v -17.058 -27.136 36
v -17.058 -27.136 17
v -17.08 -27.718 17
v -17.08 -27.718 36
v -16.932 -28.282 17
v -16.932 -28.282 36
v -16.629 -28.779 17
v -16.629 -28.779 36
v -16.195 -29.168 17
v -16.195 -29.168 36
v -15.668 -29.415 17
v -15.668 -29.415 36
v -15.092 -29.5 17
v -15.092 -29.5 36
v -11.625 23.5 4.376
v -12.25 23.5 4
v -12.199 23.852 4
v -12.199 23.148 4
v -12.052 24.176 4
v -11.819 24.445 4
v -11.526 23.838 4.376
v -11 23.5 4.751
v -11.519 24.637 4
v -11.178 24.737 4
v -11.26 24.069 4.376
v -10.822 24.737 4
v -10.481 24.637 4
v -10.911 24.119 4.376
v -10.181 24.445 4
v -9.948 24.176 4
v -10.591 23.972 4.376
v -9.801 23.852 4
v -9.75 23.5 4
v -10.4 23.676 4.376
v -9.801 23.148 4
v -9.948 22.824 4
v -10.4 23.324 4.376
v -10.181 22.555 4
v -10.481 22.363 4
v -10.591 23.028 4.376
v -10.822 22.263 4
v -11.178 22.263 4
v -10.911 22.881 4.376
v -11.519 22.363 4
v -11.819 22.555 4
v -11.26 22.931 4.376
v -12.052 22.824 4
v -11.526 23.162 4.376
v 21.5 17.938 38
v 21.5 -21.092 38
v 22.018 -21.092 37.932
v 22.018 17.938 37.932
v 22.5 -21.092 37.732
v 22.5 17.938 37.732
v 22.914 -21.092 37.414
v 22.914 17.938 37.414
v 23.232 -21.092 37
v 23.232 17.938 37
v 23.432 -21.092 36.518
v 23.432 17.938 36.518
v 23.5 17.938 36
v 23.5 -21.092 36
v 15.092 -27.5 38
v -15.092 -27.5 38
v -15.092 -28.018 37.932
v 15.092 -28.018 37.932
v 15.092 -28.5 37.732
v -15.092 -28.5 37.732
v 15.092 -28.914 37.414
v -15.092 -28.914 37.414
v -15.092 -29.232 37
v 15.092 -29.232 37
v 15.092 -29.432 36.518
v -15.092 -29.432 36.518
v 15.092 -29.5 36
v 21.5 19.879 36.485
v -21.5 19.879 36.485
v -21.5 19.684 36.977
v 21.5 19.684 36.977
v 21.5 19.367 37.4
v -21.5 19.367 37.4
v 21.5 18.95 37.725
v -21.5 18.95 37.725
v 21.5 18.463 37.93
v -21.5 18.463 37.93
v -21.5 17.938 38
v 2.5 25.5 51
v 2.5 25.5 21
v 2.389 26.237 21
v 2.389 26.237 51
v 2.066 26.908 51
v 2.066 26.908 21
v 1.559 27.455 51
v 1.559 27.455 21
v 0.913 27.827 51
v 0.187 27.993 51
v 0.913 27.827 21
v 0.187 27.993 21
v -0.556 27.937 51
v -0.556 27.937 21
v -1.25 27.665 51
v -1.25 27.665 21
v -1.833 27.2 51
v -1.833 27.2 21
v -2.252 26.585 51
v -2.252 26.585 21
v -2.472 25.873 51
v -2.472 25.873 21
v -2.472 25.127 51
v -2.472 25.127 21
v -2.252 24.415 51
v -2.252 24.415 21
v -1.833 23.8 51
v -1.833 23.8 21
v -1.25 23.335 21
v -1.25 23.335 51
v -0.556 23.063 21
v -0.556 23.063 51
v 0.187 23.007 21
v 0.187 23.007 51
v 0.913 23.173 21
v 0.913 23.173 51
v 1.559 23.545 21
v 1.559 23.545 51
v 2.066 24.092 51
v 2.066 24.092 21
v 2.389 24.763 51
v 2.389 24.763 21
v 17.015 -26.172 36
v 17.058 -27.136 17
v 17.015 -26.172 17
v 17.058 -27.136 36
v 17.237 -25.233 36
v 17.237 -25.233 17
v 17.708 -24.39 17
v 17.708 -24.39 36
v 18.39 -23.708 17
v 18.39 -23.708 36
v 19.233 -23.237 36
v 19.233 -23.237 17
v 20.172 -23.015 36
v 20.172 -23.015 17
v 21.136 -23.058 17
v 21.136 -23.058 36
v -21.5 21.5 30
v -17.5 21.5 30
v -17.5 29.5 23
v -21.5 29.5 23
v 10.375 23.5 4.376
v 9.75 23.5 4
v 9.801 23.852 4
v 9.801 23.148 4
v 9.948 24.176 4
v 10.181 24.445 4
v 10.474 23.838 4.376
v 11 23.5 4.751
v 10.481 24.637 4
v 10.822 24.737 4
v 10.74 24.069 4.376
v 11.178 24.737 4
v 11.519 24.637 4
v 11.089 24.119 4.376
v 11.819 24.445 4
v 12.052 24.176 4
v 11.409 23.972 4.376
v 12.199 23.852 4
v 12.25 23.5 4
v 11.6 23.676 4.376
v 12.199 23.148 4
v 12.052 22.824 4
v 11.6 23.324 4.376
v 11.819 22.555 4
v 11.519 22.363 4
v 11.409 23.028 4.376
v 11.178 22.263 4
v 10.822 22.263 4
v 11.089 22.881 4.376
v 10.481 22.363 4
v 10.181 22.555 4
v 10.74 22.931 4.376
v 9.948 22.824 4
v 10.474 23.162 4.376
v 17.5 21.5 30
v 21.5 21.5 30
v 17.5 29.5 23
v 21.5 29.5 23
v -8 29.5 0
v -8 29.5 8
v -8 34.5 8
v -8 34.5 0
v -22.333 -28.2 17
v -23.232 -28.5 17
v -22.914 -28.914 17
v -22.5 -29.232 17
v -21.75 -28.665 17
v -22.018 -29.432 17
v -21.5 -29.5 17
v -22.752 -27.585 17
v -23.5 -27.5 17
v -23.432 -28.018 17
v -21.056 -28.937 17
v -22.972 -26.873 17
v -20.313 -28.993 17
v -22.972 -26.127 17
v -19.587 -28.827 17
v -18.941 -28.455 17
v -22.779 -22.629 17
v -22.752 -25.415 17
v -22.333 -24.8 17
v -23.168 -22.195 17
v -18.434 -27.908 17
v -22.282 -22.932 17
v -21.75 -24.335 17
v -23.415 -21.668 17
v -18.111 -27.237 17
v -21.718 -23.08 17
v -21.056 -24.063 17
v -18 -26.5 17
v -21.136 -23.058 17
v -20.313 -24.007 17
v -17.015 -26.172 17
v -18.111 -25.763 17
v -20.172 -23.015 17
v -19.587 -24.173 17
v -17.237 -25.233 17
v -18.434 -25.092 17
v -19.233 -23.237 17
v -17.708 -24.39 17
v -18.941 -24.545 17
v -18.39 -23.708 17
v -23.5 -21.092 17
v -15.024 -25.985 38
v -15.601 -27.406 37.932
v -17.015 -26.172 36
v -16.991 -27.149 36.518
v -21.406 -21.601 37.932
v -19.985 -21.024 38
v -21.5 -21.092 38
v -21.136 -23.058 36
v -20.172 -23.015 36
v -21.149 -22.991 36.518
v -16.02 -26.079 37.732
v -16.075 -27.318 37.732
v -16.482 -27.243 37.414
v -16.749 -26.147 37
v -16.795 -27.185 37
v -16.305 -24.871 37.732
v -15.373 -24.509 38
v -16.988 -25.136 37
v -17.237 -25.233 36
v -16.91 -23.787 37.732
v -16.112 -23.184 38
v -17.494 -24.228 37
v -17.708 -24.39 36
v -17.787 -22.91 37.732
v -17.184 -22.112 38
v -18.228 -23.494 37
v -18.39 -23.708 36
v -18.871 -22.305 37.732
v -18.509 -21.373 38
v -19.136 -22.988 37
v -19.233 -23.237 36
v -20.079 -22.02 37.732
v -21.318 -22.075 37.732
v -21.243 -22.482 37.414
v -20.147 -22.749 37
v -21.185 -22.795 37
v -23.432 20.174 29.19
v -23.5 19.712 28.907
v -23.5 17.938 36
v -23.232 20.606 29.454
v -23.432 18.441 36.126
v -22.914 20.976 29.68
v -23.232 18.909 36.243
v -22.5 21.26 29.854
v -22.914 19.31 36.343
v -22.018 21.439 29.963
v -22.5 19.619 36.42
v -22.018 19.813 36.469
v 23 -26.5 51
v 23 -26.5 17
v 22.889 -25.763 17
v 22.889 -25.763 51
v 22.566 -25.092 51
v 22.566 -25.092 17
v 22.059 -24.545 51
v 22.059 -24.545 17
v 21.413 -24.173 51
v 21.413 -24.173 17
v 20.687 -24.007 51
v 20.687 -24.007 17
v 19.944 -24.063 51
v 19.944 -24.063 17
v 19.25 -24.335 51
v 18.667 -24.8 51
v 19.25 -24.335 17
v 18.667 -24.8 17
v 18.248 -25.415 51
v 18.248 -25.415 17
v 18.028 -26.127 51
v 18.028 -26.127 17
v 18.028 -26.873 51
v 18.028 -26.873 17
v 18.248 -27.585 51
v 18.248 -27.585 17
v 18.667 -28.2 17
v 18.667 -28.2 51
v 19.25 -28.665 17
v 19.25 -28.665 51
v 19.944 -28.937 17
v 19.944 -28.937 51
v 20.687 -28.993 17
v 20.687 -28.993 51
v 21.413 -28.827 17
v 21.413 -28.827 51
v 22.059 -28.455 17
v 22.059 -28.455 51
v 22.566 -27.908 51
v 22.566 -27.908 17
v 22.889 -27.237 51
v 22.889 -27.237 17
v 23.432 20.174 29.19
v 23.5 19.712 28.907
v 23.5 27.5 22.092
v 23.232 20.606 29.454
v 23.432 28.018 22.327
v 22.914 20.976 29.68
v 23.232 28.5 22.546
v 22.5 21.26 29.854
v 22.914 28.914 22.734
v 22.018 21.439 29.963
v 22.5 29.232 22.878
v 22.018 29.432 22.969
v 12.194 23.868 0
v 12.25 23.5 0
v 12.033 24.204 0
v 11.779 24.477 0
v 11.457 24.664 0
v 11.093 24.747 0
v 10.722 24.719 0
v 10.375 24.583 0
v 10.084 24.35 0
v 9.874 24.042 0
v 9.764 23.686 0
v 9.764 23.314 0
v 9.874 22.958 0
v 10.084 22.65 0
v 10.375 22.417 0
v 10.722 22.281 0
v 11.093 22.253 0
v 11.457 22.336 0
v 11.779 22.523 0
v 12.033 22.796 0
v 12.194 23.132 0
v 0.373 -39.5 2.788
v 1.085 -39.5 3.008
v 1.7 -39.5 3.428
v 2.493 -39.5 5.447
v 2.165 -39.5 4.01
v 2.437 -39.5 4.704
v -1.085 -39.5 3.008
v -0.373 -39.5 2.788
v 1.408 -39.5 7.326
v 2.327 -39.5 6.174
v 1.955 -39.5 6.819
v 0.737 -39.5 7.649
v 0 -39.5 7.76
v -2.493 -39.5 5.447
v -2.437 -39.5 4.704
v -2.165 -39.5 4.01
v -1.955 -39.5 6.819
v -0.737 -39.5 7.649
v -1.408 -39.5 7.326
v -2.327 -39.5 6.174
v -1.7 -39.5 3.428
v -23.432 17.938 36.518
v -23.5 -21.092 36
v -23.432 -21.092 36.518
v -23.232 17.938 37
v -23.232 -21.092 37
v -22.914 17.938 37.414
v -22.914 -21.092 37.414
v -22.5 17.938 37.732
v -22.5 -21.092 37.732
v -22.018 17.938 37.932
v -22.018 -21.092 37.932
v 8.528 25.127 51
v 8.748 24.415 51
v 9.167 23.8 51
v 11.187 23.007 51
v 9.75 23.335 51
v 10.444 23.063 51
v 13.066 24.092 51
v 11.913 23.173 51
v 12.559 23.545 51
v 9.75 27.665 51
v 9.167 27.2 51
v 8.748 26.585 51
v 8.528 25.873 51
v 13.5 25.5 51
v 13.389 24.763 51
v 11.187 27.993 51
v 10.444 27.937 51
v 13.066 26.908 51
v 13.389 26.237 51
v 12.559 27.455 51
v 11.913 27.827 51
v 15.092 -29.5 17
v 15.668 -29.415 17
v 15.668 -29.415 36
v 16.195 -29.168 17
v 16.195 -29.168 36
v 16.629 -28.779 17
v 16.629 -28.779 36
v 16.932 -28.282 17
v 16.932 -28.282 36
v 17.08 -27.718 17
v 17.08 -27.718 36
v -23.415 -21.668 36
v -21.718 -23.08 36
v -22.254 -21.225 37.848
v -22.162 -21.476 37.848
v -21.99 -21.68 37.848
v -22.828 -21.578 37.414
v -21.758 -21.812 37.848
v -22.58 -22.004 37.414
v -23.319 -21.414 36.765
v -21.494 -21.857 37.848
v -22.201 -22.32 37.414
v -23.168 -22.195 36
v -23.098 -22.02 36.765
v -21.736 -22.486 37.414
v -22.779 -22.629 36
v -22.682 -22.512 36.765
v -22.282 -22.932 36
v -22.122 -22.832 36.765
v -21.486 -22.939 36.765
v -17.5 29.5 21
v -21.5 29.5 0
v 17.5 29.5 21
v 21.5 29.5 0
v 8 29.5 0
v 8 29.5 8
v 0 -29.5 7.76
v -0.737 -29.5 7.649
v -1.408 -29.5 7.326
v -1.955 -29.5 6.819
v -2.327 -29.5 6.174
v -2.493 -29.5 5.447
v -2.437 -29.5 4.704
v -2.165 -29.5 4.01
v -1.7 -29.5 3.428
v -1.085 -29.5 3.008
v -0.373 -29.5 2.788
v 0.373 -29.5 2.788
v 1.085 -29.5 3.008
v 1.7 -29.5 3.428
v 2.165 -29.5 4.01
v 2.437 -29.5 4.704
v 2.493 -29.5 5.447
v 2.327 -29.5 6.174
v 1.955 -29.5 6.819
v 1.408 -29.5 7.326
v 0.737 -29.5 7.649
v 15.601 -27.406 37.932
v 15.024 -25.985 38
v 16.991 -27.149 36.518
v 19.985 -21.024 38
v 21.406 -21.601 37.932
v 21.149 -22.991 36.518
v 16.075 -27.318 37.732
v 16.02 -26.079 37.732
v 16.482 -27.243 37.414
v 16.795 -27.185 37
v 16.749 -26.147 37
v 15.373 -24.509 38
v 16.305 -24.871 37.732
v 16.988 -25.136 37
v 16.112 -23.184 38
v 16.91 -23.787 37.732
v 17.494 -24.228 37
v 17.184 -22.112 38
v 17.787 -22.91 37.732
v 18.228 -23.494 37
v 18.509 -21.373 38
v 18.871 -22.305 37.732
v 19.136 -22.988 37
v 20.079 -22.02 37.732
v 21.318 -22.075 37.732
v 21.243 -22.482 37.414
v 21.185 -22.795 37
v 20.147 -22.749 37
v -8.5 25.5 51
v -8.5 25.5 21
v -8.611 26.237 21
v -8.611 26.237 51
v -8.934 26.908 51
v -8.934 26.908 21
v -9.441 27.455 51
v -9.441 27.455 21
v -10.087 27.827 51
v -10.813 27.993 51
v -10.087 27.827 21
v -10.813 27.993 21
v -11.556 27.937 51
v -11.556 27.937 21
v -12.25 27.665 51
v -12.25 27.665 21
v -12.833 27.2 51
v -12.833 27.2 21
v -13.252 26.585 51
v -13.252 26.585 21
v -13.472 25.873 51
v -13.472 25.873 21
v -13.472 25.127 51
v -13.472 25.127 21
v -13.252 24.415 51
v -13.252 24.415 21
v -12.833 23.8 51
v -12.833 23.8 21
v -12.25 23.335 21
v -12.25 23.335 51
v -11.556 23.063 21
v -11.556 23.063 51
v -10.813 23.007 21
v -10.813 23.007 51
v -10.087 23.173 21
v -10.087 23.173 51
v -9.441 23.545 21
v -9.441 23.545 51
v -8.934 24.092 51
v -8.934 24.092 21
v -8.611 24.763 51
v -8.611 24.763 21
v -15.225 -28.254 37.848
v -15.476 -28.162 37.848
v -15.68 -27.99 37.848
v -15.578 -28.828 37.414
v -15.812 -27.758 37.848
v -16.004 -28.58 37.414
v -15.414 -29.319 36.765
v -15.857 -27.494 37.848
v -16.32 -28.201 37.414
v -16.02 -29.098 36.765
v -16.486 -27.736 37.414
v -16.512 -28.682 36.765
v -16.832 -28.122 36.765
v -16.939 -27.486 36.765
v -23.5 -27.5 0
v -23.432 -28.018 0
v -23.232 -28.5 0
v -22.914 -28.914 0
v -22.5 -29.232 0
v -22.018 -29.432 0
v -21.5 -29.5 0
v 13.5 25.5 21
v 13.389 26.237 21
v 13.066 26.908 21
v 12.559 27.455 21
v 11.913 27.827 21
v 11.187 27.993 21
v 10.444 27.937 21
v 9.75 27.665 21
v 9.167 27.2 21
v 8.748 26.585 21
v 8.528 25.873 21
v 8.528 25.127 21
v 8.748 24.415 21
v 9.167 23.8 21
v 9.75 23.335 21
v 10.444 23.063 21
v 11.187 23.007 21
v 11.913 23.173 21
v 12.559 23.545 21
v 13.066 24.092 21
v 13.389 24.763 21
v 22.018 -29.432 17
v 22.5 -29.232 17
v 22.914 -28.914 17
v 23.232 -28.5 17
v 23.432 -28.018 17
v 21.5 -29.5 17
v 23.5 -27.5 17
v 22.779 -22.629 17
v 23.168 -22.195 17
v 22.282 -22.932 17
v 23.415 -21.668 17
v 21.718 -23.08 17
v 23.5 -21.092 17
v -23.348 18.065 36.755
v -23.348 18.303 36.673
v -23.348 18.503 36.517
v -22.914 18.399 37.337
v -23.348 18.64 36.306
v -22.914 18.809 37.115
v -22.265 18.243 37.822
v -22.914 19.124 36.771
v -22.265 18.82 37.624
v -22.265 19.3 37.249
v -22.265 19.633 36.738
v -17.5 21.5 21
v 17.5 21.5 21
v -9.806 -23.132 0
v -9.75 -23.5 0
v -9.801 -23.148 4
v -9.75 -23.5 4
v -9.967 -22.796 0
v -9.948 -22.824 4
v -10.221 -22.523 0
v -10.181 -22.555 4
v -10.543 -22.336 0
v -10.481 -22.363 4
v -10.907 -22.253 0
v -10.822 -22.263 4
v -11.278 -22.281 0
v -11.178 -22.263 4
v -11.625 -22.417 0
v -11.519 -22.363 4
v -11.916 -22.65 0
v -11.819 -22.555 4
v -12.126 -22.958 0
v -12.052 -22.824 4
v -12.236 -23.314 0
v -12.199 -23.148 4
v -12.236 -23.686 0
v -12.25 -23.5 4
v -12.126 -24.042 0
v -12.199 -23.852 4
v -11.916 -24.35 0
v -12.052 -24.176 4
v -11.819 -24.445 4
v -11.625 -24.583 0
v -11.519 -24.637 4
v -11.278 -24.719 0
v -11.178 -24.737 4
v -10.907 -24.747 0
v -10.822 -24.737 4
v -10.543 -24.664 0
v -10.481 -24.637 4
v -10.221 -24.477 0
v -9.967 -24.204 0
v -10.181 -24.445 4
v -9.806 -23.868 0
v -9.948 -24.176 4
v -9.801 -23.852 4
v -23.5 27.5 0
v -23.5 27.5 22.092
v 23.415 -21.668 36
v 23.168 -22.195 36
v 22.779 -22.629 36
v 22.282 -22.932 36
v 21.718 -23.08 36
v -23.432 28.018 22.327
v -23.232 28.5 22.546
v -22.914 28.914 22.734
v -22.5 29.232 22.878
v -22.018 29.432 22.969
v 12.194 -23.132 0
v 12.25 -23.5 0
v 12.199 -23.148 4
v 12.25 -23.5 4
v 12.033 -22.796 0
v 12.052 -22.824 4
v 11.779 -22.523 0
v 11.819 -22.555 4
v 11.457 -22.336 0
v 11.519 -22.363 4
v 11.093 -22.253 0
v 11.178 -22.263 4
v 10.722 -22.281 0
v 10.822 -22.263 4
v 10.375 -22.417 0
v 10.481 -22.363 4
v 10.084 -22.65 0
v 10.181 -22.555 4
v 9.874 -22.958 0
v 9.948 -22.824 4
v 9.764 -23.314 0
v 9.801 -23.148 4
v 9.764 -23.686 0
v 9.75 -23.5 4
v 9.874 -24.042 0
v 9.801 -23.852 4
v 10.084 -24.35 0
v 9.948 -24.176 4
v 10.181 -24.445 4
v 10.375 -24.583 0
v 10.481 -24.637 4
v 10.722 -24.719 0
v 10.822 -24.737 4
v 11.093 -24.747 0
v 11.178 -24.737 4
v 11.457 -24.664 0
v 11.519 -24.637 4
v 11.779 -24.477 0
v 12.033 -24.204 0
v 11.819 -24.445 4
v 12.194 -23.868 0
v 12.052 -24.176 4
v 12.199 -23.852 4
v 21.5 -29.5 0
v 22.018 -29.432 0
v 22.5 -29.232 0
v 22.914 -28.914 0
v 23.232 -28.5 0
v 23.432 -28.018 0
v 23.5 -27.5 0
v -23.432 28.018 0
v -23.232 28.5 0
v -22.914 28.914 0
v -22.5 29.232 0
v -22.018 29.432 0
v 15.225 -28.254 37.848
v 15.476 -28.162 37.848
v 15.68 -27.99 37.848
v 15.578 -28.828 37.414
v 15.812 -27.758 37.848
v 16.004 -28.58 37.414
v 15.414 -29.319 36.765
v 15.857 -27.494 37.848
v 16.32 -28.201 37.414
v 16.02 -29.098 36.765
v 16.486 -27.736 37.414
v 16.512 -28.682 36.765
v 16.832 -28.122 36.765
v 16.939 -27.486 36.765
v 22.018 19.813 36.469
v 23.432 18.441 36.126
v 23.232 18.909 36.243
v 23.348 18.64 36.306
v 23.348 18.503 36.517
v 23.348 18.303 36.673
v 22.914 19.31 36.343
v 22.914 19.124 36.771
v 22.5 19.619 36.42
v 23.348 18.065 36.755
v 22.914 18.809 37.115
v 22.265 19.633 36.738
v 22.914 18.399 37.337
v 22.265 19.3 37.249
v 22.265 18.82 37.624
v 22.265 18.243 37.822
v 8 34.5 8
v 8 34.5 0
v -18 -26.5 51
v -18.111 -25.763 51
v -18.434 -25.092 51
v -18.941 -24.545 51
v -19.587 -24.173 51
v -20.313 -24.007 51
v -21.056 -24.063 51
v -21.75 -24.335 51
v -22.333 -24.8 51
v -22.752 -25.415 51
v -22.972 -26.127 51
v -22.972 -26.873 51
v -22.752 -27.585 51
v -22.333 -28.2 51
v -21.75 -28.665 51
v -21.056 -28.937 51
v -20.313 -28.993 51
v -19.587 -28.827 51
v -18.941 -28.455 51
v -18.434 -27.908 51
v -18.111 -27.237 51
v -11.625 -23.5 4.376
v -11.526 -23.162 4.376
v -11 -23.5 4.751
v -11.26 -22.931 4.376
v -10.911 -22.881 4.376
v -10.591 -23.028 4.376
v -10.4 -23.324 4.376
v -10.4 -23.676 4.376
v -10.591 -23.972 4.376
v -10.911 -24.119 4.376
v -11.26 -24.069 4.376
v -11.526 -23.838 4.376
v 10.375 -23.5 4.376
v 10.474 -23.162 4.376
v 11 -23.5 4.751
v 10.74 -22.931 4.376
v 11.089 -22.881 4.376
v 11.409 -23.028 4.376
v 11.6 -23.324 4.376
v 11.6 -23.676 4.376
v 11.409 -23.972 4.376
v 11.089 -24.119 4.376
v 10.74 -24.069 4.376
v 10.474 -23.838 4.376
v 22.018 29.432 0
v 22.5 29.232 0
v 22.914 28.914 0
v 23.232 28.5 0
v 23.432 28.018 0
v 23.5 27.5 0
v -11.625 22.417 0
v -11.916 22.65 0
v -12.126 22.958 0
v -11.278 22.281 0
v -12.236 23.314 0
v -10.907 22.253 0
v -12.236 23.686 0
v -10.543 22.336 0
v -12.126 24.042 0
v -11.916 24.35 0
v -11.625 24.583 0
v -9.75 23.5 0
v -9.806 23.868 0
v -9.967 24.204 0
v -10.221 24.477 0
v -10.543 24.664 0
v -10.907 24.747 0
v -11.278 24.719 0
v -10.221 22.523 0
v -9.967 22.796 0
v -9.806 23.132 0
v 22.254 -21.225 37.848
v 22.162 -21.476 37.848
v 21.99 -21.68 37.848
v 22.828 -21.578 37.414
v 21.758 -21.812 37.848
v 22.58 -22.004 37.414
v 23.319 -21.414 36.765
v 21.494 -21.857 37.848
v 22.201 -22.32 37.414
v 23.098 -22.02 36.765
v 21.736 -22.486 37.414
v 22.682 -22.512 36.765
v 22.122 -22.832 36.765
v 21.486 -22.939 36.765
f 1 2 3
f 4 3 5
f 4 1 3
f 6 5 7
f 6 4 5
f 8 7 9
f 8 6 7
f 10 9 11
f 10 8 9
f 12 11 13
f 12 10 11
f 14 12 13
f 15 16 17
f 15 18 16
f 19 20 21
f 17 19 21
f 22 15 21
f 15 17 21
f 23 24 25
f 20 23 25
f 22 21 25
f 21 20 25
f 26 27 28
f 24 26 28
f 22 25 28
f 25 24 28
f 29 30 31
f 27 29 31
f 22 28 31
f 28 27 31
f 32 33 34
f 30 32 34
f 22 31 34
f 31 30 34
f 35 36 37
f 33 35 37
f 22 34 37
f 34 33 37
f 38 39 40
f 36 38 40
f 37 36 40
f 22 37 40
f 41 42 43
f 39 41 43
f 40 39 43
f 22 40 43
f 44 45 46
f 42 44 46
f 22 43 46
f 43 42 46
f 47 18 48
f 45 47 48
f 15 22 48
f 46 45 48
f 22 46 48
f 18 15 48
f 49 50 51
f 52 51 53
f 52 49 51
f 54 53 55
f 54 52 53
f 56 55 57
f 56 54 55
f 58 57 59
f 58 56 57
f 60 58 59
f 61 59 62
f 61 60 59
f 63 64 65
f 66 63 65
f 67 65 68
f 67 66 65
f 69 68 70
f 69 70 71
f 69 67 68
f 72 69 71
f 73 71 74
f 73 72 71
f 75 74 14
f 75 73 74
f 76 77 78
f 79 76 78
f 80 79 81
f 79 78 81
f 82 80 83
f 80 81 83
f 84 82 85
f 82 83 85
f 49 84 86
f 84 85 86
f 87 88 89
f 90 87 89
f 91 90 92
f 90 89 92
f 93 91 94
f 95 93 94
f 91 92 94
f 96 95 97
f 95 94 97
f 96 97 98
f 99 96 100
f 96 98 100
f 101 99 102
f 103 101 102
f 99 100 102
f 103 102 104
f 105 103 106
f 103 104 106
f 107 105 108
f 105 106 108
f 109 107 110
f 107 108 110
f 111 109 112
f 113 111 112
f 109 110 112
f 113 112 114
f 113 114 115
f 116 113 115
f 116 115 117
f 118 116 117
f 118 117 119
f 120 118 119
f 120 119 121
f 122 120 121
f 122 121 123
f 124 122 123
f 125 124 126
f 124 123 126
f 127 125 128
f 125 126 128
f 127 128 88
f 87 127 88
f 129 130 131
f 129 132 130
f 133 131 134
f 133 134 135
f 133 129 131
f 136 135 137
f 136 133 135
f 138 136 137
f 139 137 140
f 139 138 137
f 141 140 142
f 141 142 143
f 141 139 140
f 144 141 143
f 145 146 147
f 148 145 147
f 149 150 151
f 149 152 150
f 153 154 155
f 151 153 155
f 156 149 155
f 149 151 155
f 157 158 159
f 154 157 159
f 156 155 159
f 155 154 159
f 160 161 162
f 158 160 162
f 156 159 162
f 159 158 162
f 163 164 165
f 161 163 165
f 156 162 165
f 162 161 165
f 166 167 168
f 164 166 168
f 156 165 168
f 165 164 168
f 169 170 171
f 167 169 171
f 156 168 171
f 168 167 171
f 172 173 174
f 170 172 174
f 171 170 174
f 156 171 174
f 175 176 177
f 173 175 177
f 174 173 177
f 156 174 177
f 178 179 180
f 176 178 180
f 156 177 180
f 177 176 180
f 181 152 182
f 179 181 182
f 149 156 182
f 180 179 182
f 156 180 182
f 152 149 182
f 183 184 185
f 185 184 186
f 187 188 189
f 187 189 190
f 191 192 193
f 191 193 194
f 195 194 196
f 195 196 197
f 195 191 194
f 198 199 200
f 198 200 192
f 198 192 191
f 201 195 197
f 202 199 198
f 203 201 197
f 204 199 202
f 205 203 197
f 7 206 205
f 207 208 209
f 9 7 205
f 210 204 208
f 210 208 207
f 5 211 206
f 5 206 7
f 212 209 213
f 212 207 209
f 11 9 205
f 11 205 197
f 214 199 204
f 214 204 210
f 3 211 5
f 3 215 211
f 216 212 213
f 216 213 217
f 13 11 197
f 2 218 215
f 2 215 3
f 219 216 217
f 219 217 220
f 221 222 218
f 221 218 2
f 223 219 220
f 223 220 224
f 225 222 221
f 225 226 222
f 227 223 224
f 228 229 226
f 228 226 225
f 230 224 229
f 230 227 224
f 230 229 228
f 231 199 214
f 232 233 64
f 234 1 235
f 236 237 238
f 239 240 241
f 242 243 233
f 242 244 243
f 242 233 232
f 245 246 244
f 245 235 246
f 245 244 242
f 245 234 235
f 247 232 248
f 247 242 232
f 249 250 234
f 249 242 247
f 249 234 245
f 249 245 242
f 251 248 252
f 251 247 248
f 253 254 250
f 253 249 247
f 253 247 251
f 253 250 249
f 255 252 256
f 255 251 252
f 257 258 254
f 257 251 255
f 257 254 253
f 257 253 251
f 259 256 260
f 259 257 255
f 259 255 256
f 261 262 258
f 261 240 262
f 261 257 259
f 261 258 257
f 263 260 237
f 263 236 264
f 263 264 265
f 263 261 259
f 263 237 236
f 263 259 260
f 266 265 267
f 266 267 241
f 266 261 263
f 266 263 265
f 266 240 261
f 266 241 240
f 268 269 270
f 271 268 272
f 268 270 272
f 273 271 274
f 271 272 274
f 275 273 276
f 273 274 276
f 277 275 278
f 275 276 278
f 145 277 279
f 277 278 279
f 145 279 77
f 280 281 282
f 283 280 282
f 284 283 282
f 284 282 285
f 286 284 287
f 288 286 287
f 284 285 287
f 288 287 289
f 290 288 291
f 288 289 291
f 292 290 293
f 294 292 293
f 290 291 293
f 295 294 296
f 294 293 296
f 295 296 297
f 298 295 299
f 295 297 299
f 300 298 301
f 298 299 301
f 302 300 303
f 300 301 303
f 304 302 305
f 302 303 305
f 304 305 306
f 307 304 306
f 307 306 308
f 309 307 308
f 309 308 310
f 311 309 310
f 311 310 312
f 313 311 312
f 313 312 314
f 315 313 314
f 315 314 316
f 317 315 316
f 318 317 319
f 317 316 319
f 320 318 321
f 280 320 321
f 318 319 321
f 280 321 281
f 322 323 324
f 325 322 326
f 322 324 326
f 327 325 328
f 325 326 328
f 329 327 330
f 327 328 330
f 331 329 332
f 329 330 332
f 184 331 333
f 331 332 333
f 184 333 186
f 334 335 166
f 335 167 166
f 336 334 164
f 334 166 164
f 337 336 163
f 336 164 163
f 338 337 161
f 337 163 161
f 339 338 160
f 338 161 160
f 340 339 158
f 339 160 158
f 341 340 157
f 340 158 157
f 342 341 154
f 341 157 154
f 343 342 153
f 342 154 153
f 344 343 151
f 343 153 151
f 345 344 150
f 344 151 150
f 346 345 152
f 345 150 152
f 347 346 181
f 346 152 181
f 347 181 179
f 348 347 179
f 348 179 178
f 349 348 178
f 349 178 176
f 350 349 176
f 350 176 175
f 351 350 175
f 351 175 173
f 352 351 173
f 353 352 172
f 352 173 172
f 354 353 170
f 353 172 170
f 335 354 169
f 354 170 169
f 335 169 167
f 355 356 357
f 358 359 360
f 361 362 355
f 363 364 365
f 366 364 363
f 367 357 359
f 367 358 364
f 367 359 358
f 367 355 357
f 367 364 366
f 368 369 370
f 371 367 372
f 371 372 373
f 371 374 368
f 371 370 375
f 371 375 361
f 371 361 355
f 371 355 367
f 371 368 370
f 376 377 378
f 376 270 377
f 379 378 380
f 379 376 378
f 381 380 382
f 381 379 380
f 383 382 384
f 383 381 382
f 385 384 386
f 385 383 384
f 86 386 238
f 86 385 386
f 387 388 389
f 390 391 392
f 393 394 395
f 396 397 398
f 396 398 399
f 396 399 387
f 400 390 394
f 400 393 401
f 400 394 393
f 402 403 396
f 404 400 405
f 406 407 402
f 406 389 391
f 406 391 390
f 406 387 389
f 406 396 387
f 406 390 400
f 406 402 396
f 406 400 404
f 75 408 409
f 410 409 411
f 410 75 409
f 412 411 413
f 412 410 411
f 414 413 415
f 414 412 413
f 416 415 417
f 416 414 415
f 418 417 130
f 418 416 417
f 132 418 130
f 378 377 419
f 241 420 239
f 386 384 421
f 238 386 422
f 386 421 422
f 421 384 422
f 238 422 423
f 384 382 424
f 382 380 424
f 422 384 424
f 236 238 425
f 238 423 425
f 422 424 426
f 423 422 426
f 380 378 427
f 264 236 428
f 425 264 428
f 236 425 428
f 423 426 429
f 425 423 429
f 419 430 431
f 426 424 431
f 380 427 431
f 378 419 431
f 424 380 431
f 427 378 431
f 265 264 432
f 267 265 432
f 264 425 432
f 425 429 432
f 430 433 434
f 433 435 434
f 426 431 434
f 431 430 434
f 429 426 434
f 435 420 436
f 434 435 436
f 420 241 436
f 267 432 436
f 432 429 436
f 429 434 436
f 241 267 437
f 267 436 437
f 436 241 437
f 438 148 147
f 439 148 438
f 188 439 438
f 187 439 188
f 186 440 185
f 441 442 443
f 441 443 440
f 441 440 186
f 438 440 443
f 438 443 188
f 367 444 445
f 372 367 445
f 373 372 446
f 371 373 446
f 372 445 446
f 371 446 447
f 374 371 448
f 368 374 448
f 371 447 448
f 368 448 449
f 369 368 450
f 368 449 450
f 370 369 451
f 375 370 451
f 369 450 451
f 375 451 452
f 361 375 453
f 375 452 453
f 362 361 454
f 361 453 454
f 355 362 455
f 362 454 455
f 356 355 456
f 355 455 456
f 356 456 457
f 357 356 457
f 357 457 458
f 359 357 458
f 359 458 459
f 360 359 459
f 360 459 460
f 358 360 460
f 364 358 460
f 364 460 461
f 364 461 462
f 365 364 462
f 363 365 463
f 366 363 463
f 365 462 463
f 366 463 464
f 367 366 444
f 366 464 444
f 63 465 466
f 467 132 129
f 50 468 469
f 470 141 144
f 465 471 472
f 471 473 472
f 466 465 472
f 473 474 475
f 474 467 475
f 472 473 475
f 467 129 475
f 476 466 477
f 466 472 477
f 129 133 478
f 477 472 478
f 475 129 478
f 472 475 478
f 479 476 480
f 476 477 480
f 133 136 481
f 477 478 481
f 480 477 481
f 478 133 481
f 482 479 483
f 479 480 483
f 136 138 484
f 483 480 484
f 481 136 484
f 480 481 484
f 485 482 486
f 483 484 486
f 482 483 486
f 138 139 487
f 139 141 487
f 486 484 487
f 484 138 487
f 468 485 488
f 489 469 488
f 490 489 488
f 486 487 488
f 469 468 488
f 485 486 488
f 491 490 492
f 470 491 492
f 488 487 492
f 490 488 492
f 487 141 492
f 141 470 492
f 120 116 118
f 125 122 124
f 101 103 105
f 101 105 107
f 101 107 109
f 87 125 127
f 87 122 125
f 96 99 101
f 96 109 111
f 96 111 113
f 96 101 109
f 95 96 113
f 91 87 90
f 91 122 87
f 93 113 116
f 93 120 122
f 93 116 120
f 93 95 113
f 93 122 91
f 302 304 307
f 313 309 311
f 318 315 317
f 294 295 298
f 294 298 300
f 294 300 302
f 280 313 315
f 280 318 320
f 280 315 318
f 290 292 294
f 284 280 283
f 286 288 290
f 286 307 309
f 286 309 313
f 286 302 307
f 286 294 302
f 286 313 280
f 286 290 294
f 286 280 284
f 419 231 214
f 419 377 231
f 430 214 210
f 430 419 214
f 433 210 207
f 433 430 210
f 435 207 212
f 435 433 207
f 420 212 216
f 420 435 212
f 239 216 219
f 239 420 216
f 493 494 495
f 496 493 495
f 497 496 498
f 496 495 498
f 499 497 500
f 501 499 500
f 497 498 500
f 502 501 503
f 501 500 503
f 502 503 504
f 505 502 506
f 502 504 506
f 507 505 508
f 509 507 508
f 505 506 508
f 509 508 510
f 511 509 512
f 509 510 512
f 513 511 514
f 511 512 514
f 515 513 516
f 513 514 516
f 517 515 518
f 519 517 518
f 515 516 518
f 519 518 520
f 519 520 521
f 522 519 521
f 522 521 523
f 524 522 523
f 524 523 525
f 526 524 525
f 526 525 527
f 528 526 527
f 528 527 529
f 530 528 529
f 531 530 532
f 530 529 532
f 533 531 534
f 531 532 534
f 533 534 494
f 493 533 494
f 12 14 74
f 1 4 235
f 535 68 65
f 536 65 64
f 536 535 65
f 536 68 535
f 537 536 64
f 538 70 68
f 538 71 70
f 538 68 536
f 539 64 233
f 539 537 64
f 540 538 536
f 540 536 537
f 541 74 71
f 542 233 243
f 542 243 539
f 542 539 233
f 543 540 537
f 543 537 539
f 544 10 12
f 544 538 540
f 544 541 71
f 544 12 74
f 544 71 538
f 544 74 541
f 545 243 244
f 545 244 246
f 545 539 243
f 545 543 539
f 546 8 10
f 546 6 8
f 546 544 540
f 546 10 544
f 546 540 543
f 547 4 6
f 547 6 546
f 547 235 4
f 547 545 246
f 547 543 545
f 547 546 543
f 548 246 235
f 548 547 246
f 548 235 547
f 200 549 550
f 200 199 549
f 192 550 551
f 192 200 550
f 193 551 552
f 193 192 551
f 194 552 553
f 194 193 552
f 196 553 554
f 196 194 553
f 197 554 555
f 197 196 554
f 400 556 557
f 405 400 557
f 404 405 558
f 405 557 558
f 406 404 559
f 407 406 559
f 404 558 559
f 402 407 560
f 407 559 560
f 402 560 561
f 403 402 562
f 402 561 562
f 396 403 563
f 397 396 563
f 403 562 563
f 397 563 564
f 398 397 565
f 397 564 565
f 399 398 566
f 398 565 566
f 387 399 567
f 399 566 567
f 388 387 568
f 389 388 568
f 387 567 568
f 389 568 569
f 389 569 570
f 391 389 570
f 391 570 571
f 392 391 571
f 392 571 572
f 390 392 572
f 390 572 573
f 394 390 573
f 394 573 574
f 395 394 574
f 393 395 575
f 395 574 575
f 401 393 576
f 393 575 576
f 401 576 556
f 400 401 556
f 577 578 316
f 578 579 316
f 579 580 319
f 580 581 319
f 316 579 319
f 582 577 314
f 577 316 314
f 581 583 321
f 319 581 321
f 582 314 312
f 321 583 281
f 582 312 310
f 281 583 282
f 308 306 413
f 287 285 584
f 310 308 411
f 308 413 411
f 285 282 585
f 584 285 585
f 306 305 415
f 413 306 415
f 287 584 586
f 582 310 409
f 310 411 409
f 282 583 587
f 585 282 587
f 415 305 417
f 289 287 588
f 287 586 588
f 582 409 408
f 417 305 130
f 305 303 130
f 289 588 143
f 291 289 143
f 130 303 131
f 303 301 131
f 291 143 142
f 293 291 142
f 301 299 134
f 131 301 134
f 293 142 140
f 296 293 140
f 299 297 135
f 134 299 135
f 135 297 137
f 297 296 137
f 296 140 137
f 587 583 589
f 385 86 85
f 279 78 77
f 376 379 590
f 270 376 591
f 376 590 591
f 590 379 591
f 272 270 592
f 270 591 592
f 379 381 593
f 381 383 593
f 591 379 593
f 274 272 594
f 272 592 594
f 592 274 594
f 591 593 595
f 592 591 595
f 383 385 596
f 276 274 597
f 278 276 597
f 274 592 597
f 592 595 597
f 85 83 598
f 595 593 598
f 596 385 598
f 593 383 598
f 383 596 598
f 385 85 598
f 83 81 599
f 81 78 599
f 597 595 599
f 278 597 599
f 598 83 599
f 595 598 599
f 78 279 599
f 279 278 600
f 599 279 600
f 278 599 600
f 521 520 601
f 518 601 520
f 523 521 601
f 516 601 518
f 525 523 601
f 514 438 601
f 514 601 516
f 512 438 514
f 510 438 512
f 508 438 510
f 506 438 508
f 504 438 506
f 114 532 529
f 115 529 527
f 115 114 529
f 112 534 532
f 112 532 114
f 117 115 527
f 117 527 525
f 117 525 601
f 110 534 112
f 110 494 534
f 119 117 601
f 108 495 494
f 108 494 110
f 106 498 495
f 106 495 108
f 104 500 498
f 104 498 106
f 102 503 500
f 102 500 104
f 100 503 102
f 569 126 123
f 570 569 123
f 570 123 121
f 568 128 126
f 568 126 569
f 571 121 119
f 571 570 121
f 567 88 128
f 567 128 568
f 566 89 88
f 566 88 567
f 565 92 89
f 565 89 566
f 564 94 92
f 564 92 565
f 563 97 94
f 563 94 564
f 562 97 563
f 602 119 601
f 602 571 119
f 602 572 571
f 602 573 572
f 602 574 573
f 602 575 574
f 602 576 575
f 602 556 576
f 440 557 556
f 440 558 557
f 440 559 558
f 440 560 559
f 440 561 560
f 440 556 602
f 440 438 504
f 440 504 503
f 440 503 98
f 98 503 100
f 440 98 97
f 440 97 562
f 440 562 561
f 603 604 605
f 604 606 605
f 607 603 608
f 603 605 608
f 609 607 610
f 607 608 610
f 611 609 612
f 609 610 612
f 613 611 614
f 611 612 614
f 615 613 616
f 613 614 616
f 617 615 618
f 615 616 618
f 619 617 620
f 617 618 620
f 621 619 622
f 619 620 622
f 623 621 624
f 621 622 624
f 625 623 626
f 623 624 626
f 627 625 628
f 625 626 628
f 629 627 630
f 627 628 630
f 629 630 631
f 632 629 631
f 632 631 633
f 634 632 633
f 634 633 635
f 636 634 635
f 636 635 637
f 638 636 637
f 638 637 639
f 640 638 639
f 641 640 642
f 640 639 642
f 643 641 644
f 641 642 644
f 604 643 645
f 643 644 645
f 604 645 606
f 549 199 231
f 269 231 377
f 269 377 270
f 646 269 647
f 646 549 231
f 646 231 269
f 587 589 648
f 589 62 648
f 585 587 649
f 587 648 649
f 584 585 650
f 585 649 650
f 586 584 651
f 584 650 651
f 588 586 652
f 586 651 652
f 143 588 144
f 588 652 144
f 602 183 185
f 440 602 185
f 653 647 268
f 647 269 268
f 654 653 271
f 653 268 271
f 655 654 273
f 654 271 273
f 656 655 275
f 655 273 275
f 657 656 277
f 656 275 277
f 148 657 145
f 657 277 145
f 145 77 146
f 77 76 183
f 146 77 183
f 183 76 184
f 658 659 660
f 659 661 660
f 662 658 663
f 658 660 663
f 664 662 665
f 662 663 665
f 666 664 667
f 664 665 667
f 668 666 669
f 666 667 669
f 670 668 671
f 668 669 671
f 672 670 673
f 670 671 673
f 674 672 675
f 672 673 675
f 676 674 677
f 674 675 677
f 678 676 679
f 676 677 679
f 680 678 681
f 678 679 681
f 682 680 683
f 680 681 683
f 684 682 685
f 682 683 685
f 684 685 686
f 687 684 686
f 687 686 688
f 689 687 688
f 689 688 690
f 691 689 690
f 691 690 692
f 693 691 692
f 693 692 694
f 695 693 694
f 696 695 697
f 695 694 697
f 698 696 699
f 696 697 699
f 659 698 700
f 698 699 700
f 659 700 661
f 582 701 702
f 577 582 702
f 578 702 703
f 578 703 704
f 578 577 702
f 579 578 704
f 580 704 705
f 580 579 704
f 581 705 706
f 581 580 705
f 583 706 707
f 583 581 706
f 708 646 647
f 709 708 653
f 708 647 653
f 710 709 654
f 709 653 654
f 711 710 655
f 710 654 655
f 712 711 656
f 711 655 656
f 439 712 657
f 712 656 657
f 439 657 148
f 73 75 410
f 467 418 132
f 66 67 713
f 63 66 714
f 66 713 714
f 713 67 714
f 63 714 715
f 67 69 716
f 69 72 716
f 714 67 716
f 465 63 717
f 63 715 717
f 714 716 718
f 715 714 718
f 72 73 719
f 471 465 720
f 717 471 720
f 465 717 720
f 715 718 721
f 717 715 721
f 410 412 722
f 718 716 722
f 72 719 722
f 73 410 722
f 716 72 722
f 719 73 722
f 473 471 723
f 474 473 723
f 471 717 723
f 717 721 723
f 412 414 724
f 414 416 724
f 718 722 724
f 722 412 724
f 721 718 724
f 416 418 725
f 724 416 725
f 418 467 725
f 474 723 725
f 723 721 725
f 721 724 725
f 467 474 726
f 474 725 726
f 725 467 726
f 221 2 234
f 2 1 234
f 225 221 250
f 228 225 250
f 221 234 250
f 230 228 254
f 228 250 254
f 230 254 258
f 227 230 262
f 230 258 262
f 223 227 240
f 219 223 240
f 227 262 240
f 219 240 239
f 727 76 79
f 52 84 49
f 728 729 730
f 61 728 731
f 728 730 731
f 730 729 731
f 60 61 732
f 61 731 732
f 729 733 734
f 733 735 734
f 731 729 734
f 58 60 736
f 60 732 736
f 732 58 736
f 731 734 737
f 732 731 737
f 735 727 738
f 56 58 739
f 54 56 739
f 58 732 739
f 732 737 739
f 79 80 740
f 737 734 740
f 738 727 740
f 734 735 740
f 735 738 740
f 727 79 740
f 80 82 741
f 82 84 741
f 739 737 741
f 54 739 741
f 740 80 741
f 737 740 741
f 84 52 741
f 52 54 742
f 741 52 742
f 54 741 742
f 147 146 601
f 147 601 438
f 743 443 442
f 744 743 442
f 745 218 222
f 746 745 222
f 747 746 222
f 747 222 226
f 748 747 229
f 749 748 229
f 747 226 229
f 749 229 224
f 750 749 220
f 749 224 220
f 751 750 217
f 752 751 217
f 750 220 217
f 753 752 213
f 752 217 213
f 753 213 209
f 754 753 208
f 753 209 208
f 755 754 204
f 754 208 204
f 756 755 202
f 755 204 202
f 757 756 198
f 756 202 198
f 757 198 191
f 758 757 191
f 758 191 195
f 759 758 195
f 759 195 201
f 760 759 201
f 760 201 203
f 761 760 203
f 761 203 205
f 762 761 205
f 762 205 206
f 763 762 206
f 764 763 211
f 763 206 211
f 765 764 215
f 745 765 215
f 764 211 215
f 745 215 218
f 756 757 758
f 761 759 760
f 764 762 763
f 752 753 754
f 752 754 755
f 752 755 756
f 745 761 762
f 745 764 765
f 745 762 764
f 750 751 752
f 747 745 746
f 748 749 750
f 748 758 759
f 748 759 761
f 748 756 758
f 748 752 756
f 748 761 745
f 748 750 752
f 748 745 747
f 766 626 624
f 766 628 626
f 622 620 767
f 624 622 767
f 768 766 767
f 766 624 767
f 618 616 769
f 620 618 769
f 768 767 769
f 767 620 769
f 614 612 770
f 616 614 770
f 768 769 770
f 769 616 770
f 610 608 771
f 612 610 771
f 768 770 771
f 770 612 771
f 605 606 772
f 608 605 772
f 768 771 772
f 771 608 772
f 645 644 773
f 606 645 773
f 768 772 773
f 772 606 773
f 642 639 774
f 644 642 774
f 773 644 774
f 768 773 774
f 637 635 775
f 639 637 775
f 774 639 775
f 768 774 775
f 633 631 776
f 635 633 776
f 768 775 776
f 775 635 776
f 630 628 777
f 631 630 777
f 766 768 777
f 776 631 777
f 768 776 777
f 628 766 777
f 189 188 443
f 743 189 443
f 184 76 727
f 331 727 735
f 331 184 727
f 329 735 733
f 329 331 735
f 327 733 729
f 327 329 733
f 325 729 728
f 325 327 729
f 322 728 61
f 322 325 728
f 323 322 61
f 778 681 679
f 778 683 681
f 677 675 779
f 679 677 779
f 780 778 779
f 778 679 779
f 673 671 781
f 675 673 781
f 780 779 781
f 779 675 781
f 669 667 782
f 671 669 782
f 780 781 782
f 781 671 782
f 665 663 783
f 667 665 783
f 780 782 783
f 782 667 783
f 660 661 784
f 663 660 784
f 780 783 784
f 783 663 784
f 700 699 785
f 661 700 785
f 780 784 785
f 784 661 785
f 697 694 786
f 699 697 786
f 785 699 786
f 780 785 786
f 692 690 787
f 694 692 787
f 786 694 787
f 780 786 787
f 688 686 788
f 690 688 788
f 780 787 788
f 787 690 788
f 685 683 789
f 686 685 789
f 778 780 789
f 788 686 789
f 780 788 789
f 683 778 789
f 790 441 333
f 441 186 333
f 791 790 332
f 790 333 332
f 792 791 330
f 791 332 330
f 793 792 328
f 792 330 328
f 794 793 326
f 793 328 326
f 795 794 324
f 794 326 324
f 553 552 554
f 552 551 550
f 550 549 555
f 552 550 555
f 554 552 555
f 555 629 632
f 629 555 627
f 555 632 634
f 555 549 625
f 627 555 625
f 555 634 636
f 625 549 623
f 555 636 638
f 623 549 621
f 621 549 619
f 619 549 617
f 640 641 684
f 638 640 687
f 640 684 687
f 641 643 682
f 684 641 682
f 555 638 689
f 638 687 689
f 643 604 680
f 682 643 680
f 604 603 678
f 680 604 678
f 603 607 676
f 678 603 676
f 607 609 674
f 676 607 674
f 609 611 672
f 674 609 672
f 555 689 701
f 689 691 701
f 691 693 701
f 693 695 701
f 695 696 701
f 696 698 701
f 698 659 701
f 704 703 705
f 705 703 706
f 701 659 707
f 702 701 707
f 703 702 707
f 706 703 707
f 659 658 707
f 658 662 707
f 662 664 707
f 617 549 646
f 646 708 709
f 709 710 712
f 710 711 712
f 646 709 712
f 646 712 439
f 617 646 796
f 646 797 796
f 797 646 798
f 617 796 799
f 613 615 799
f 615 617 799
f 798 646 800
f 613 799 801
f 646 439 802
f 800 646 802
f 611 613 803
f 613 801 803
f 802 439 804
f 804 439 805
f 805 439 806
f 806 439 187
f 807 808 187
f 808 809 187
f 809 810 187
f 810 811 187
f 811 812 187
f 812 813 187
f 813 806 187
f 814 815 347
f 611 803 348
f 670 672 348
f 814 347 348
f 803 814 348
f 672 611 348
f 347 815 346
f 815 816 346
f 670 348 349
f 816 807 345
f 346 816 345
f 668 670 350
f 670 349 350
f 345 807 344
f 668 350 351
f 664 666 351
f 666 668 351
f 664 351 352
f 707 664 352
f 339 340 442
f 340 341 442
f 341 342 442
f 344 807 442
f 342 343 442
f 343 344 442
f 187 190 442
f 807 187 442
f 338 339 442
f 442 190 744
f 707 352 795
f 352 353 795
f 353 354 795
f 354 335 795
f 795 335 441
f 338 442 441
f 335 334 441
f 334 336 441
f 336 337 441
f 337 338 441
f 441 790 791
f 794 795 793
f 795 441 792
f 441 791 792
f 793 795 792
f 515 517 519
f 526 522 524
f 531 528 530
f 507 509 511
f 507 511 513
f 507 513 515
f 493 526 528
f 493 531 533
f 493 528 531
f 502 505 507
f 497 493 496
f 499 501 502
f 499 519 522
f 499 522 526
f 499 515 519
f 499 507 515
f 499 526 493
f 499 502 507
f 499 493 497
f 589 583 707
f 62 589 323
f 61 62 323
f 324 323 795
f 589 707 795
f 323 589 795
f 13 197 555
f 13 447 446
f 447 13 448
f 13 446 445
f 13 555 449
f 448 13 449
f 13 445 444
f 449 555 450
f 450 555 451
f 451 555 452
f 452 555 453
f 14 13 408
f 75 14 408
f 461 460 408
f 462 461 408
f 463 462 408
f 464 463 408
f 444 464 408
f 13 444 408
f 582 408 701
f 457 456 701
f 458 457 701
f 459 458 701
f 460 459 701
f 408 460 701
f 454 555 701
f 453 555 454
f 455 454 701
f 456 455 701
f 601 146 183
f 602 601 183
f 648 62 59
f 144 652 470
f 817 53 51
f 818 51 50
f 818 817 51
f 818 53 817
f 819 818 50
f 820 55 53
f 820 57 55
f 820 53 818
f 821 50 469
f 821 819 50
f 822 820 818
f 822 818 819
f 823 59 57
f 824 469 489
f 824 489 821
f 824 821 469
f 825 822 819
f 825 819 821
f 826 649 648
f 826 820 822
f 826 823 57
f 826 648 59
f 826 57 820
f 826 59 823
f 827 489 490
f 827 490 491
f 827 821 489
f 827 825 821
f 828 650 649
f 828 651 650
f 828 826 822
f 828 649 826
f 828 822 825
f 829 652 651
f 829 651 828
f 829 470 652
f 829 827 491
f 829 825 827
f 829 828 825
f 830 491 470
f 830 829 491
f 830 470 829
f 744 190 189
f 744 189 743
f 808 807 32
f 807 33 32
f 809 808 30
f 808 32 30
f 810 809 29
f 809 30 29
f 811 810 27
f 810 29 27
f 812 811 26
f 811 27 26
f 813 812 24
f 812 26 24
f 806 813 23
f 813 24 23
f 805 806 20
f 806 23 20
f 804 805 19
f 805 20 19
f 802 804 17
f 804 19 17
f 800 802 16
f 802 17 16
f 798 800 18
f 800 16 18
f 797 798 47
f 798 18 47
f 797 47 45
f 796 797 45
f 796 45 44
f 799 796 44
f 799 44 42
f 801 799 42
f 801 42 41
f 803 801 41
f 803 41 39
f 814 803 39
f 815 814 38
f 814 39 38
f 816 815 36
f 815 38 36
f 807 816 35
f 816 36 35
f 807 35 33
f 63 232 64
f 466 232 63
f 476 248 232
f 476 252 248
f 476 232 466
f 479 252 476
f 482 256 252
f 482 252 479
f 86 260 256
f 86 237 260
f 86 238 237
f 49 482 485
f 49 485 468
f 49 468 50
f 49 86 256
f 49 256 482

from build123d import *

# Parameters (mm, degrees)
SKETCH_1_W          = 47
SKETCH_1_H          = 59
EXTRUDE_1_DEPTH     = 38
CUT_EXTRUDE_1_DEPTH = 68.25511133
SKETCH_3_W          = 35
SKETCH_3_H          = 8
CUT_EXTRUDE_2_DEPTH = 17
SKETCH_4_R          = 2.5
EXTRUDE_2_DEPTH     = 30
CUT_EXTRUDE_3_DEPTH = 21
SKETCH_6_R          = 2.5
EXTRUDE_3_DEPTH     = 34
FILLET_1_R          = 2
M3X0_51_D           = 2.5
M3X0_51_DEPTH       = 4
M3X0_51_TIP         = 0.751075774
SKETCH_10_R         = 2.5
EXTRUDE_4_DEPTH     = 10
SKETCH_11_W         = 16
SKETCH_11_H         = 8
EXTRUDE_5_DEPTH     = 5


with BuildPart() as part:
    # Эскиз1 → Бобышка-Вытянуть1 (new body)
    with BuildSketch(Plane.XY):
        Rectangle(SKETCH_1_W, SKETCH_1_H)
    extrude(amount=EXTRUDE_1_DEPTH)

    # Эскиз2 → Вырез-Вытянуть1 (cut, through all)
    with BuildSketch(Plane(origin=(23.5, 0, 0), x_dir=(0, 0, -1), z_dir=(1, 0, 0))):
        Polygon((-38, 29.5), (-38, 19.5), (-30, 21.5), (-23, 29.5), align=None)
    extrude(amount=-CUT_EXTRUDE_1_DEPTH, mode=Mode.SUBTRACT)

    # Эскиз3 → Вырез-Вытянуть2 (cut)
    with BuildSketch(Plane.XY.offset(38)):
        with Locations((0, 25.5)):
            Rectangle(SKETCH_3_W, SKETCH_3_H)
    extrude(amount=-CUT_EXTRUDE_2_DEPTH, mode=Mode.SUBTRACT)

    # Эскиз4 → Бобышка-Вытянуть2 (add)
    with BuildSketch(Plane.XY.offset(21)):
        with Locations((0, 25.5)):
            Circle(SKETCH_4_R)
        with Locations((-11, 25.5)):
            Circle(SKETCH_4_R)
        with Locations((11, 25.5)):
            Circle(SKETCH_4_R)
    extrude(amount=EXTRUDE_2_DEPTH)

    # Эскиз5 → Вырез-Вытянуть3 (cut)
    with BuildSketch(Plane.XY.offset(38)):
        with BuildLine():
            Line((-24, -26.5), (-24, -30))
            Line((-24, -30), (-20.5, -30))
            ThreePointArc((-20.5, -30), (-18.025126266, -24.025126266), (-24, -26.5))
        make_face()
        with BuildLine():
            Line((24, -26.5), (24, -30))
            Line((24, -30), (20.5, -30))
            ThreePointArc((20.5, -30), (18.025126266, -24.025126266), (24, -26.5))
        make_face()
    extrude(amount=-CUT_EXTRUDE_3_DEPTH, mode=Mode.SUBTRACT)

    # Эскиз6 → Бобышка-Вытянуть3 (add)
    with BuildSketch(Plane.XY.offset(17)):
        with Locations((-20.5, -26.5)):
            Circle(SKETCH_6_R)
        with Locations((20.5, -26.5)):
            Circle(SKETCH_6_R)
    extrude(amount=EXTRUDE_3_DEPTH)

    # Скругление1
    fillet_1_edges = [part.edges().sort_by_distance(p)[0] for p in [
        (-23.5, -2.598612181, 38),
        (-23.5, 29.5, 11.5),
        (23.5, 29.5, 11.5),
        (-23.5, 25.5, 26.5),
        (-23.5, 20.5, 34),
        (0, 19.5, 38),
        (23.5, 20.5, 34),
        (23.5, 25.5, 26.5),
        (23.5, -2.598612181, 38),
        (18.025126266, -24.025126266, 38),
        (23.5, -29.5, 8.5),
        (23.5, -24.697224362, 27.5),
        (18.697224362, -29.5, 27.5),
        (0, -29.5, 38),
        (-18.025126266, -24.025126266, 38),
        (-23.5, -29.5, 8.5),
        (-23.5, -24.697224362, 27.5),
        (-18.697224362, -29.5, 27.5),
    ]]
    fillet(fillet_1_edges, radius=FILLET_1_R)

    # Отверстие обработанное метчиком M3x0.51
    with Locations(Plane(origin=(0, 0, 0), x_dir=(-1, 0, 0), z_dir=(0, 0, -1))):
        with Locations((-11, 23.5), (11, 23.5), (11, -23.5), (-11, -23.5)):
            Hole(M3X0_51_D / 2, depth=M3X0_51_DEPTH)
            with Locations((0, 0, -(M3X0_51_DEPTH + M3X0_51_TIP / 2))):  # 118° drill point
                Cone(0, M3X0_51_D / 2, M3X0_51_TIP, mode=Mode.SUBTRACT)

    # Эскиз10 → Бобышка-Вытянуть4 (add)
    with BuildSketch(Plane.XZ.offset(29.5)):
        with Locations(Location((0, 5.26015425, 0), (0, 0, 90))):
            Circle(SKETCH_10_R)
    extrude(amount=EXTRUDE_4_DEPTH)

    # Эскиз11 → Бобышка-Вытянуть5 (add)
    with BuildSketch(Plane(origin=(0, 29.5, 0), x_dir=(1, 0, 0), z_dir=(0, 1, 0))):
        with Locations((0, -4)):
            Rectangle(SKETCH_11_W, SKETCH_11_H)
    extrude(amount=EXTRUDE_5_DEPTH)


solid = part.part
